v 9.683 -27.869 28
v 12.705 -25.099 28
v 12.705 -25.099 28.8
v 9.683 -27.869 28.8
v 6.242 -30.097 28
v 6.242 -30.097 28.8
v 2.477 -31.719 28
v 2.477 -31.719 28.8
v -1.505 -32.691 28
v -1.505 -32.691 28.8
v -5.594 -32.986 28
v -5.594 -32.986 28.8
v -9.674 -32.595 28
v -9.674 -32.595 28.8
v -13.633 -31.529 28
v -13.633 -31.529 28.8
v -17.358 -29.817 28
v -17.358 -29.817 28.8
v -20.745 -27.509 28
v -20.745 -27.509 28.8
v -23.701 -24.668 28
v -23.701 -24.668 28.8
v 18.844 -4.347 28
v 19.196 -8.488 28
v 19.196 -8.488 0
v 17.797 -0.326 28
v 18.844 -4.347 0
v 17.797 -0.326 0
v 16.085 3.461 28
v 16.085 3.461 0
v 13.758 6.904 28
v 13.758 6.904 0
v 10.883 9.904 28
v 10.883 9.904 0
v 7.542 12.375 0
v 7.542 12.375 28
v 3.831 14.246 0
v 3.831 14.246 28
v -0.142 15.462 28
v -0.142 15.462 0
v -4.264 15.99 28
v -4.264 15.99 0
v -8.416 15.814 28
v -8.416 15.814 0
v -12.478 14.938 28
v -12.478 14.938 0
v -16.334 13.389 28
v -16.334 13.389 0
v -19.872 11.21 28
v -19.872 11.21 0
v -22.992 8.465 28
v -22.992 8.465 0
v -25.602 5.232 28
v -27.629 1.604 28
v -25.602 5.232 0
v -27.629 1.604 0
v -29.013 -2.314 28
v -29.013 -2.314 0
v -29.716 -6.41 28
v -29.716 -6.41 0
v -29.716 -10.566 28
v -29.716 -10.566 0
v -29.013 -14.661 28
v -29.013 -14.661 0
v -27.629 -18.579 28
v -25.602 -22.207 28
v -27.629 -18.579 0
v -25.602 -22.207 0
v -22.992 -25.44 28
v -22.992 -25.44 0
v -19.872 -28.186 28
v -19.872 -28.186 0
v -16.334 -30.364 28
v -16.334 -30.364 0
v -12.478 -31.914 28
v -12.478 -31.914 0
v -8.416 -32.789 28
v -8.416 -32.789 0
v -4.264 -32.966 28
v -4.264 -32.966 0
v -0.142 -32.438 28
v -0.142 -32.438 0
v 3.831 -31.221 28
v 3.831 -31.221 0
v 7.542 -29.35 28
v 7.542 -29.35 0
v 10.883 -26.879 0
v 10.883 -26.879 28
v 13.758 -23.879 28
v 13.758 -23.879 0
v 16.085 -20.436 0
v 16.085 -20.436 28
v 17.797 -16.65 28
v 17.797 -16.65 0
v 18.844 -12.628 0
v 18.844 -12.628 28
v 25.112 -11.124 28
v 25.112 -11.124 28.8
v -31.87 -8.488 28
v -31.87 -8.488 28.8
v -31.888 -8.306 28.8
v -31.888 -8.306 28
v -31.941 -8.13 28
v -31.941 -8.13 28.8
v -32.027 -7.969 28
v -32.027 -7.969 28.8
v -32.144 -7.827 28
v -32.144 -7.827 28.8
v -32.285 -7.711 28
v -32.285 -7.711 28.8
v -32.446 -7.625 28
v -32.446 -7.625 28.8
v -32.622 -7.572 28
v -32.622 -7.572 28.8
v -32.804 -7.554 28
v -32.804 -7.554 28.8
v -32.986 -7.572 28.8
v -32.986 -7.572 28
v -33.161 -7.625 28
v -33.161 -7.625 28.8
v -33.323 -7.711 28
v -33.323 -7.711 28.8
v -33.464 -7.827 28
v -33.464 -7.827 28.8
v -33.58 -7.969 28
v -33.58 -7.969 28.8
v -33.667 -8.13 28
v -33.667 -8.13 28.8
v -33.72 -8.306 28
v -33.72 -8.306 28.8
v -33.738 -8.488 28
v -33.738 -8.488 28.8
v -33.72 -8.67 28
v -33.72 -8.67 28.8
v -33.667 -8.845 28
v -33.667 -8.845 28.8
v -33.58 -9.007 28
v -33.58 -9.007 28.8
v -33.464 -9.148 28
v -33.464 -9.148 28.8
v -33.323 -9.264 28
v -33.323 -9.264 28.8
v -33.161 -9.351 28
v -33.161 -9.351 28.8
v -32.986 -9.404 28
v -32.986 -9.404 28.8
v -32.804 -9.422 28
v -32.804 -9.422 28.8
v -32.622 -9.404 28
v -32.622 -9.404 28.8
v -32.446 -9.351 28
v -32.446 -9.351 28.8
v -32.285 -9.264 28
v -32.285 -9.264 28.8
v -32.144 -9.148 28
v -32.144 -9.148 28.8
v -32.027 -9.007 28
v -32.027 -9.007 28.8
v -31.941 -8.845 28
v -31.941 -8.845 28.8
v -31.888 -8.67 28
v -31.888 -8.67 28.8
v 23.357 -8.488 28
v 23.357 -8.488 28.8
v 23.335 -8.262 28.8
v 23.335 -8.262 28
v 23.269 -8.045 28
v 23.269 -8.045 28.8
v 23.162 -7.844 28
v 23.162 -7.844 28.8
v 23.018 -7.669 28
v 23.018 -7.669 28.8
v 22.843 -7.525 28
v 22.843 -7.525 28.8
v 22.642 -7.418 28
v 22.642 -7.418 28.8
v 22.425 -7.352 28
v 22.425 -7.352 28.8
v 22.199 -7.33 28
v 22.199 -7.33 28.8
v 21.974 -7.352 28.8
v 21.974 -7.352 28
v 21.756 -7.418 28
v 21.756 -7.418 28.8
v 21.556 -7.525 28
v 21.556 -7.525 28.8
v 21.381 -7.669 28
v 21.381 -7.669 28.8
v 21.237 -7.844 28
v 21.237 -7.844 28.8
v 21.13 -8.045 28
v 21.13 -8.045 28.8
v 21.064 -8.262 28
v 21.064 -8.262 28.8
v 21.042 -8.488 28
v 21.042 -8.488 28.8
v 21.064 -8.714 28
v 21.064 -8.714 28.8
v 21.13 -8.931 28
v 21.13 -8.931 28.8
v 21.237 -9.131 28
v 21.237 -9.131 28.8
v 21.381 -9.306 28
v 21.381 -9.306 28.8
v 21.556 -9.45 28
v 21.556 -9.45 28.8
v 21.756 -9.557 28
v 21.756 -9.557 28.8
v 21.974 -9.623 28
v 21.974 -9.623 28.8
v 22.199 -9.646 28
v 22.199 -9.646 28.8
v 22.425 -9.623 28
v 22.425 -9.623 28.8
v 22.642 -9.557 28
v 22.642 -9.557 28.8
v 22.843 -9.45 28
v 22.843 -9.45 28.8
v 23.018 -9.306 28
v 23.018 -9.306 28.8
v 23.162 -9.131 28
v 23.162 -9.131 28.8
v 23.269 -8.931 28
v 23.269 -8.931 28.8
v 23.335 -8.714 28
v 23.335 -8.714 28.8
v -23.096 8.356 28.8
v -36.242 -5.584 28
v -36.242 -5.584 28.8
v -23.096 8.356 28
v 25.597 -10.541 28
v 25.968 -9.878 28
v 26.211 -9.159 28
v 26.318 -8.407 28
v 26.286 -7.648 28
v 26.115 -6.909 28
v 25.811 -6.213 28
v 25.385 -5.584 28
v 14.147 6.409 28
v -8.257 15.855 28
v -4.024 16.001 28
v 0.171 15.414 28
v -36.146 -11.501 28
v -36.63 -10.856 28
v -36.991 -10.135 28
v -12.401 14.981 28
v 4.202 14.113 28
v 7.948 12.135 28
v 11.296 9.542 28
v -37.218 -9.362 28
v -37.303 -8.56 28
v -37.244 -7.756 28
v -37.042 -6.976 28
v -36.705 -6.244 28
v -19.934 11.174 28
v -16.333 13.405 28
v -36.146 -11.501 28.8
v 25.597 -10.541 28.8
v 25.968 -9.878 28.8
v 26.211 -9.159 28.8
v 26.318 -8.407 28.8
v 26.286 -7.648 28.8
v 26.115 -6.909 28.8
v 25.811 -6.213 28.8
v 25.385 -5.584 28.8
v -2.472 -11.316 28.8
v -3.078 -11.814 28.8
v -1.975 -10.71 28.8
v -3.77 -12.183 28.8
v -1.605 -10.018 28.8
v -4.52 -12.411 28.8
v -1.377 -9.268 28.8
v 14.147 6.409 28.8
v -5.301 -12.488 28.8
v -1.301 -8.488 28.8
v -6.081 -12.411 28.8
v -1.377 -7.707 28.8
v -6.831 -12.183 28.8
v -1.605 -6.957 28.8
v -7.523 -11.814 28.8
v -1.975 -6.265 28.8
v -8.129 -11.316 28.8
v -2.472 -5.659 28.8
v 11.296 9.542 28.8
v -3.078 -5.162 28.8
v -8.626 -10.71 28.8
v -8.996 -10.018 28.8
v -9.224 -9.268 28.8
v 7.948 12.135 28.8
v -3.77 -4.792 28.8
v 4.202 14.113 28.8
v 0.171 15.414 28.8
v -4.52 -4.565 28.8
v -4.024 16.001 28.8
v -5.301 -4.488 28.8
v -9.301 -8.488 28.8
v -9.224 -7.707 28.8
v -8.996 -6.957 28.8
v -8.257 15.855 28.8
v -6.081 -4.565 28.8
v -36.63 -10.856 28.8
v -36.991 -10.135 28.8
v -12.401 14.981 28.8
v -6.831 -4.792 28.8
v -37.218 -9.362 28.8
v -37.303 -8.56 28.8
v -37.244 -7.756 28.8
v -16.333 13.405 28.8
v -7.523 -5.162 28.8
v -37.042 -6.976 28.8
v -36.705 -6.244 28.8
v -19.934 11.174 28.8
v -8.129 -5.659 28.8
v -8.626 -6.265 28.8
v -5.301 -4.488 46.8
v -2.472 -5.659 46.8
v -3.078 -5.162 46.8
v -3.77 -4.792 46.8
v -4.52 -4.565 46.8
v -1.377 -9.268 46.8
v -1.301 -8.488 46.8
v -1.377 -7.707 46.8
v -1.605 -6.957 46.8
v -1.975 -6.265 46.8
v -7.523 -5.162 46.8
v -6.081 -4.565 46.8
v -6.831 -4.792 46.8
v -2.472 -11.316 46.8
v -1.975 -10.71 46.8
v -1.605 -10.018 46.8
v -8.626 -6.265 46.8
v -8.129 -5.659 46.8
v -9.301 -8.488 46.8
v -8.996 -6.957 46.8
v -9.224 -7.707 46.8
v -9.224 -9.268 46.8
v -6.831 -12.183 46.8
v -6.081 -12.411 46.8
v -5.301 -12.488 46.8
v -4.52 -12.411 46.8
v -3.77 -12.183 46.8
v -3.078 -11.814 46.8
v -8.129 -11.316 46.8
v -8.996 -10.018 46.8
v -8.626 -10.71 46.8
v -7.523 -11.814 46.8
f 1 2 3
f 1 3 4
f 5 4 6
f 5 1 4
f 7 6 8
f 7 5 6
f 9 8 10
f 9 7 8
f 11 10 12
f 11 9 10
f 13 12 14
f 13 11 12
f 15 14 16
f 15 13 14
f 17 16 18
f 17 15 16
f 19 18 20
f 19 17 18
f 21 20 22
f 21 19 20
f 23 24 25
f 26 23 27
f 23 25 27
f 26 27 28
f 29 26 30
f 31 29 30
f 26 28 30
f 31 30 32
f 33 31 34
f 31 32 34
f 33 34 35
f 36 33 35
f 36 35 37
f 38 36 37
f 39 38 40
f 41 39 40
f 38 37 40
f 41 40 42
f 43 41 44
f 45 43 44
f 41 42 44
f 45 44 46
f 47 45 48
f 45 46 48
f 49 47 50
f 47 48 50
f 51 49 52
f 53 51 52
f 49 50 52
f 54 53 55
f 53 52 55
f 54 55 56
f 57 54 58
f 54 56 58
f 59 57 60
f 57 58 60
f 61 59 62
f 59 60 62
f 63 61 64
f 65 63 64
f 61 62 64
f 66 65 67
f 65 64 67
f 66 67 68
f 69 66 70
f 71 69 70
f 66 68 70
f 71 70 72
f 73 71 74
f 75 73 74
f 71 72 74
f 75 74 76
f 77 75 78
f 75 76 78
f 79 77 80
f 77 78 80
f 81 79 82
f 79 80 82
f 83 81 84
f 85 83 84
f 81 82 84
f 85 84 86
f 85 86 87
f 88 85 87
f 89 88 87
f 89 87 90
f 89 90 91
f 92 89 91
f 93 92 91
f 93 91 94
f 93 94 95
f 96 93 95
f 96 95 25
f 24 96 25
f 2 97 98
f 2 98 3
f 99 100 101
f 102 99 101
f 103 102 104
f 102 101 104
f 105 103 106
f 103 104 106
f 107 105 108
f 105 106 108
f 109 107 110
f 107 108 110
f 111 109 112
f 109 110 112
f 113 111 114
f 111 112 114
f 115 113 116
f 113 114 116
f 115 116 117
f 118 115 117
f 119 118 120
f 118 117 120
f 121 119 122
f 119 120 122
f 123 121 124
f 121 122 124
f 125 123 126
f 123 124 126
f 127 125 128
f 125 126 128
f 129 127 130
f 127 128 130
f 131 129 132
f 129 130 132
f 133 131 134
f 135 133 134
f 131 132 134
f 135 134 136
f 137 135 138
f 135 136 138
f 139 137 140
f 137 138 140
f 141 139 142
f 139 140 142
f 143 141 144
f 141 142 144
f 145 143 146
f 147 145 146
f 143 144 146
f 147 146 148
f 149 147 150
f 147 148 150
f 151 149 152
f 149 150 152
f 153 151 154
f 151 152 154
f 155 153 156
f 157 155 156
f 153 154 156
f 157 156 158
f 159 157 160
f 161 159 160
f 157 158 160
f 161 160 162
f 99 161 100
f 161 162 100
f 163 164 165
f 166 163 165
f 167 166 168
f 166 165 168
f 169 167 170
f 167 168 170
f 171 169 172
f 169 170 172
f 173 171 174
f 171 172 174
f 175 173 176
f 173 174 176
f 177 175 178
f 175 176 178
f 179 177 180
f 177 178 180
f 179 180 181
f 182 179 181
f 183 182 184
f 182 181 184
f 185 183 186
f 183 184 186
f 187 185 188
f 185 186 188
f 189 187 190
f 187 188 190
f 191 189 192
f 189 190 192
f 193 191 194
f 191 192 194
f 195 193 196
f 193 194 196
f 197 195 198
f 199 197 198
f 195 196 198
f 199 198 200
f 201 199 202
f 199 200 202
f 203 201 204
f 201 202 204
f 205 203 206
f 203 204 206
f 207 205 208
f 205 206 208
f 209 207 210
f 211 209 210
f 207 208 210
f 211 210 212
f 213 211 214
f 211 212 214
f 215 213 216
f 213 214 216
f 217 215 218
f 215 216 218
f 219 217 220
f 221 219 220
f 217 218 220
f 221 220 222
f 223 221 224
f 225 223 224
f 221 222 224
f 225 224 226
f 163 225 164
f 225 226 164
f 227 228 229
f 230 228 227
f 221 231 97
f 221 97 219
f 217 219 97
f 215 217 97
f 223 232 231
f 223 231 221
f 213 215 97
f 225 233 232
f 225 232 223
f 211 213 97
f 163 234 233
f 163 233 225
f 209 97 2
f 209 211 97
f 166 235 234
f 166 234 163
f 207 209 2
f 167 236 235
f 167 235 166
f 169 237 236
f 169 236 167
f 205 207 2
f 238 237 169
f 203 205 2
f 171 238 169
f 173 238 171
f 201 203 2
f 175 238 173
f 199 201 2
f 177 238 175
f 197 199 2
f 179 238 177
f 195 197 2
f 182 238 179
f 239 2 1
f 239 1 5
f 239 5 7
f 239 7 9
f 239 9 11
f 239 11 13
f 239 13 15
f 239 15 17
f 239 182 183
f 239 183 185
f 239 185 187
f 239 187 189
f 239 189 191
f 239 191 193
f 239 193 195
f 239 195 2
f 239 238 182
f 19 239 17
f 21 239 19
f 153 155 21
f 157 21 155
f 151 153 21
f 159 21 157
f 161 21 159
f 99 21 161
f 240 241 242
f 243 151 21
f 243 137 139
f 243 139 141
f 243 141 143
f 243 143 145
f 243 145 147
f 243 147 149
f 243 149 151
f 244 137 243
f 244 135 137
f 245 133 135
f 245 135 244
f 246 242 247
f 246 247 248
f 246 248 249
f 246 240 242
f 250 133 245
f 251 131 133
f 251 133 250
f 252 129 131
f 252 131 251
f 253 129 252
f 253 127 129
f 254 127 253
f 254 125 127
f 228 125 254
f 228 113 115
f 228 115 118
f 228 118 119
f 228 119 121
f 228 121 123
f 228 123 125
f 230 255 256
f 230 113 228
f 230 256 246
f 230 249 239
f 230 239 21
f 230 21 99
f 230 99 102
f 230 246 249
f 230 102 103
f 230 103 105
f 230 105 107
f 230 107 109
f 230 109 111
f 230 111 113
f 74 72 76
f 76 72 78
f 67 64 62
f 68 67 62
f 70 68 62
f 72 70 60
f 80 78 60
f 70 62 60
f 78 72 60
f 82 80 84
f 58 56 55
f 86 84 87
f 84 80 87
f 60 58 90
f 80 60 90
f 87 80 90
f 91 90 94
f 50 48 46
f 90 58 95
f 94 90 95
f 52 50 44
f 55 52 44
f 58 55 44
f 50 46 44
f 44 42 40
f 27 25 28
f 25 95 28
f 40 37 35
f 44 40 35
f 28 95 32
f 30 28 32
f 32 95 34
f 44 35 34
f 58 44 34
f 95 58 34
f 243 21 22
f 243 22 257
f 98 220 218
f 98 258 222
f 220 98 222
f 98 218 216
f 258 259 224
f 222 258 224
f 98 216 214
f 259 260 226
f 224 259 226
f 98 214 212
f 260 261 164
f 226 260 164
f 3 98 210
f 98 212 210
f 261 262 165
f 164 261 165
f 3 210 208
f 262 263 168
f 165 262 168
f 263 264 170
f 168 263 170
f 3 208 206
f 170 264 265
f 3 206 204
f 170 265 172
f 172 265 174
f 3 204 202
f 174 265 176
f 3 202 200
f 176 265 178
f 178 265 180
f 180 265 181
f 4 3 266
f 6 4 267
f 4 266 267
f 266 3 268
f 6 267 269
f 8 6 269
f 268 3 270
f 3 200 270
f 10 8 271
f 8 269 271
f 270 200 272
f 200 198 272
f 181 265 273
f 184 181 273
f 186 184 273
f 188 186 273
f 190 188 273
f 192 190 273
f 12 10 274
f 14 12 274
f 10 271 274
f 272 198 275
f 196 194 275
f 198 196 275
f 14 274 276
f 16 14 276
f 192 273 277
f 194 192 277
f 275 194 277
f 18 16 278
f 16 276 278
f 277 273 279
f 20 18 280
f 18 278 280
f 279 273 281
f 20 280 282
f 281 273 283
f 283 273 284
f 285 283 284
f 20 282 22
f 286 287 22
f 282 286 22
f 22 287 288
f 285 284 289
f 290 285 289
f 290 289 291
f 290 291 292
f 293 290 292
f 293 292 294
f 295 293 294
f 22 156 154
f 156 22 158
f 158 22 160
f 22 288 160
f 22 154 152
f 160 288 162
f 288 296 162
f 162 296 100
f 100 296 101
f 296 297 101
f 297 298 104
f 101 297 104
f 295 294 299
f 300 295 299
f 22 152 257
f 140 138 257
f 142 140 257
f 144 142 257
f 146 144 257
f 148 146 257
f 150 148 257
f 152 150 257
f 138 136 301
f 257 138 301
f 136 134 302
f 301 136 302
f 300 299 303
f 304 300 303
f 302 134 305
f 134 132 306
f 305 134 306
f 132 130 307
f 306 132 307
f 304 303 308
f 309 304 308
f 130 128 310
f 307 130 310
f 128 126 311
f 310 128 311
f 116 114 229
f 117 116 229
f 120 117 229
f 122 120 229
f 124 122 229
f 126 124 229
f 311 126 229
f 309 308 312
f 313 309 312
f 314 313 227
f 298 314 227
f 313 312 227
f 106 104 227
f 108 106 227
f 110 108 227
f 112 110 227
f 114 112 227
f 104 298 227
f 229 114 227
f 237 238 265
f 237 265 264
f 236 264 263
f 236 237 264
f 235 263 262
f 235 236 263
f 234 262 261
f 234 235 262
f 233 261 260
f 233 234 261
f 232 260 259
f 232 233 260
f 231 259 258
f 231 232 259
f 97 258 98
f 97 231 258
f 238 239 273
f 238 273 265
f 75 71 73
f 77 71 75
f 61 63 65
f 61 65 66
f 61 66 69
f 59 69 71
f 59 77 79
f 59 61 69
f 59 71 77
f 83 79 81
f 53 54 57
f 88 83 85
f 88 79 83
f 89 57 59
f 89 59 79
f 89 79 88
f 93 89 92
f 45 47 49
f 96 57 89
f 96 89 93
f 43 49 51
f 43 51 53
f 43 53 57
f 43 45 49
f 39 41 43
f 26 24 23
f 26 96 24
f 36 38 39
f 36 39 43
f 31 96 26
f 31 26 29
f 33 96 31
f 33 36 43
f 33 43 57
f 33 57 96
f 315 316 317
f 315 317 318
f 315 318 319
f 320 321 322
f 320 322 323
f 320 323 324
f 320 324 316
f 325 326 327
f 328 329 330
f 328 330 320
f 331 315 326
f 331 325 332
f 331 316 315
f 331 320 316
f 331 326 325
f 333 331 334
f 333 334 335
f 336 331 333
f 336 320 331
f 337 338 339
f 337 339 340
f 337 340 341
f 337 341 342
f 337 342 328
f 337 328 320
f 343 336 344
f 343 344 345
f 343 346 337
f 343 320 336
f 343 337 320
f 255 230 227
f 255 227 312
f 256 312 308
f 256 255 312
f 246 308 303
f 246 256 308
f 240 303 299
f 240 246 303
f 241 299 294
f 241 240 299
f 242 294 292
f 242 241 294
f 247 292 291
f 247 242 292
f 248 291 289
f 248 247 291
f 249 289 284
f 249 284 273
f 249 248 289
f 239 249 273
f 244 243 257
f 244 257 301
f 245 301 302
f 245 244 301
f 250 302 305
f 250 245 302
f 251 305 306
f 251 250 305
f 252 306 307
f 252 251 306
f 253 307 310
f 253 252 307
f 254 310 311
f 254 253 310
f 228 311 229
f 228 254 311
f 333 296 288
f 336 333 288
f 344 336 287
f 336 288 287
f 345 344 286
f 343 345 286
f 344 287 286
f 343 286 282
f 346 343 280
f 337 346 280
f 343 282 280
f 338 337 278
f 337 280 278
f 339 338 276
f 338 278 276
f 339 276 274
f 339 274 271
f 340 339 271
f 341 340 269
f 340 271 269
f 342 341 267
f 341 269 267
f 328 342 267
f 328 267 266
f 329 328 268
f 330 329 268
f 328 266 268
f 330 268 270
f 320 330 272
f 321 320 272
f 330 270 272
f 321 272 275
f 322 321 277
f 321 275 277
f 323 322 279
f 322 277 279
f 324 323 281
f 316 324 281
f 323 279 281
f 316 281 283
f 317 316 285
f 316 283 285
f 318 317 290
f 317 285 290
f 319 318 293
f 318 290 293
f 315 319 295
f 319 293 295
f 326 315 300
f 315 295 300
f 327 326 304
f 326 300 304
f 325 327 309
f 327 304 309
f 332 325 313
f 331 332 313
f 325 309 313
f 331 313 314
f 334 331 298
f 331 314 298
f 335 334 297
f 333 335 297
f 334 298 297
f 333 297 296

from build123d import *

# Parameters (mm, degrees)
SKETCH_1_R          = 24.5
EXTRUDE_1_DEPTH     = 28
EXTRUDE_3_DEPTH     = 0.8
SKETCH_6_R          = 0.933836341
SKETCH_6_R_2        = 1.157857081
CUT_EXTRUDE_4_DEPTH = 0.8
SKETCH_7_R          = 4
EXTRUDE_4_DEPTH     = 18


with BuildPart() as part:
    # Эскиз1 → Бобышка-Вытянуть1 (new body)
    with BuildSketch(Plane.XY):
        with Locations((-5.303851292, -8.487763012)):
            Circle(SKETCH_1_R)
    extrude(amount=EXTRUDE_1_DEPTH)


with BuildPart() as body_2:
    # Эскиз5 → Бобышка-Вытянуть3 (new body)
    with BuildSketch(Plane.XY.offset(28)):
        with BuildLine():
            Line((-36.24167132, -5.584076828), (-23.095503823, 8.355844091))
            ThreePointArc((-23.095503823, 8.355844091), (-4.02362972, 16.000645984), (14.147137789, 6.408848138))
            Line((14.147137789, 6.408848138), (25.385400671, -5.584076828))
            ThreePointArc((25.385400671, -5.584076828), (26.317981115, -8.406954521), (25.111514012, -11.124082027))
            Line((25.111514012, -11.124082027), (12.70492036, -25.099028575))
            ThreePointArc((12.70492036, -25.099028575), (-5.593800919, -32.986047222), (-23.700728785, -24.668149241))
            Line((-23.700728785, -24.668149241), (-36.146351928, -11.500683439))
            ThreePointArc((-36.146351928, -11.500683439), (-37.303267424, -8.560250781), (-36.24167132, -5.584076828))
        make_face()
    extrude(amount=EXTRUDE_3_DEPTH)

    # Эскиз6 → Вырез-Вытянуть4 (cut)
    with BuildSketch(Plane.XY.offset(28.8)):
        with Locations((-32.803851292, -8.487763012)):
            Circle(SKETCH_6_R)
        with Locations((22.199388632, -8.487763012)):
            Circle(SKETCH_6_R_2)
    extrude(amount=-CUT_EXTRUDE_4_DEPTH, mode=Mode.SUBTRACT)

    # Эскиз7 → Бобышка-Вытянуть4 (add)
    with BuildSketch(Plane.XY.offset(28.8)):
        with Locations(Location((-5.300611368, -8.487763012, 0), (0, 0, 180))):
            Circle(SKETCH_7_R)
    extrude(amount=EXTRUDE_4_DEPTH)


solid = Compound([part.part, body_2.part])
